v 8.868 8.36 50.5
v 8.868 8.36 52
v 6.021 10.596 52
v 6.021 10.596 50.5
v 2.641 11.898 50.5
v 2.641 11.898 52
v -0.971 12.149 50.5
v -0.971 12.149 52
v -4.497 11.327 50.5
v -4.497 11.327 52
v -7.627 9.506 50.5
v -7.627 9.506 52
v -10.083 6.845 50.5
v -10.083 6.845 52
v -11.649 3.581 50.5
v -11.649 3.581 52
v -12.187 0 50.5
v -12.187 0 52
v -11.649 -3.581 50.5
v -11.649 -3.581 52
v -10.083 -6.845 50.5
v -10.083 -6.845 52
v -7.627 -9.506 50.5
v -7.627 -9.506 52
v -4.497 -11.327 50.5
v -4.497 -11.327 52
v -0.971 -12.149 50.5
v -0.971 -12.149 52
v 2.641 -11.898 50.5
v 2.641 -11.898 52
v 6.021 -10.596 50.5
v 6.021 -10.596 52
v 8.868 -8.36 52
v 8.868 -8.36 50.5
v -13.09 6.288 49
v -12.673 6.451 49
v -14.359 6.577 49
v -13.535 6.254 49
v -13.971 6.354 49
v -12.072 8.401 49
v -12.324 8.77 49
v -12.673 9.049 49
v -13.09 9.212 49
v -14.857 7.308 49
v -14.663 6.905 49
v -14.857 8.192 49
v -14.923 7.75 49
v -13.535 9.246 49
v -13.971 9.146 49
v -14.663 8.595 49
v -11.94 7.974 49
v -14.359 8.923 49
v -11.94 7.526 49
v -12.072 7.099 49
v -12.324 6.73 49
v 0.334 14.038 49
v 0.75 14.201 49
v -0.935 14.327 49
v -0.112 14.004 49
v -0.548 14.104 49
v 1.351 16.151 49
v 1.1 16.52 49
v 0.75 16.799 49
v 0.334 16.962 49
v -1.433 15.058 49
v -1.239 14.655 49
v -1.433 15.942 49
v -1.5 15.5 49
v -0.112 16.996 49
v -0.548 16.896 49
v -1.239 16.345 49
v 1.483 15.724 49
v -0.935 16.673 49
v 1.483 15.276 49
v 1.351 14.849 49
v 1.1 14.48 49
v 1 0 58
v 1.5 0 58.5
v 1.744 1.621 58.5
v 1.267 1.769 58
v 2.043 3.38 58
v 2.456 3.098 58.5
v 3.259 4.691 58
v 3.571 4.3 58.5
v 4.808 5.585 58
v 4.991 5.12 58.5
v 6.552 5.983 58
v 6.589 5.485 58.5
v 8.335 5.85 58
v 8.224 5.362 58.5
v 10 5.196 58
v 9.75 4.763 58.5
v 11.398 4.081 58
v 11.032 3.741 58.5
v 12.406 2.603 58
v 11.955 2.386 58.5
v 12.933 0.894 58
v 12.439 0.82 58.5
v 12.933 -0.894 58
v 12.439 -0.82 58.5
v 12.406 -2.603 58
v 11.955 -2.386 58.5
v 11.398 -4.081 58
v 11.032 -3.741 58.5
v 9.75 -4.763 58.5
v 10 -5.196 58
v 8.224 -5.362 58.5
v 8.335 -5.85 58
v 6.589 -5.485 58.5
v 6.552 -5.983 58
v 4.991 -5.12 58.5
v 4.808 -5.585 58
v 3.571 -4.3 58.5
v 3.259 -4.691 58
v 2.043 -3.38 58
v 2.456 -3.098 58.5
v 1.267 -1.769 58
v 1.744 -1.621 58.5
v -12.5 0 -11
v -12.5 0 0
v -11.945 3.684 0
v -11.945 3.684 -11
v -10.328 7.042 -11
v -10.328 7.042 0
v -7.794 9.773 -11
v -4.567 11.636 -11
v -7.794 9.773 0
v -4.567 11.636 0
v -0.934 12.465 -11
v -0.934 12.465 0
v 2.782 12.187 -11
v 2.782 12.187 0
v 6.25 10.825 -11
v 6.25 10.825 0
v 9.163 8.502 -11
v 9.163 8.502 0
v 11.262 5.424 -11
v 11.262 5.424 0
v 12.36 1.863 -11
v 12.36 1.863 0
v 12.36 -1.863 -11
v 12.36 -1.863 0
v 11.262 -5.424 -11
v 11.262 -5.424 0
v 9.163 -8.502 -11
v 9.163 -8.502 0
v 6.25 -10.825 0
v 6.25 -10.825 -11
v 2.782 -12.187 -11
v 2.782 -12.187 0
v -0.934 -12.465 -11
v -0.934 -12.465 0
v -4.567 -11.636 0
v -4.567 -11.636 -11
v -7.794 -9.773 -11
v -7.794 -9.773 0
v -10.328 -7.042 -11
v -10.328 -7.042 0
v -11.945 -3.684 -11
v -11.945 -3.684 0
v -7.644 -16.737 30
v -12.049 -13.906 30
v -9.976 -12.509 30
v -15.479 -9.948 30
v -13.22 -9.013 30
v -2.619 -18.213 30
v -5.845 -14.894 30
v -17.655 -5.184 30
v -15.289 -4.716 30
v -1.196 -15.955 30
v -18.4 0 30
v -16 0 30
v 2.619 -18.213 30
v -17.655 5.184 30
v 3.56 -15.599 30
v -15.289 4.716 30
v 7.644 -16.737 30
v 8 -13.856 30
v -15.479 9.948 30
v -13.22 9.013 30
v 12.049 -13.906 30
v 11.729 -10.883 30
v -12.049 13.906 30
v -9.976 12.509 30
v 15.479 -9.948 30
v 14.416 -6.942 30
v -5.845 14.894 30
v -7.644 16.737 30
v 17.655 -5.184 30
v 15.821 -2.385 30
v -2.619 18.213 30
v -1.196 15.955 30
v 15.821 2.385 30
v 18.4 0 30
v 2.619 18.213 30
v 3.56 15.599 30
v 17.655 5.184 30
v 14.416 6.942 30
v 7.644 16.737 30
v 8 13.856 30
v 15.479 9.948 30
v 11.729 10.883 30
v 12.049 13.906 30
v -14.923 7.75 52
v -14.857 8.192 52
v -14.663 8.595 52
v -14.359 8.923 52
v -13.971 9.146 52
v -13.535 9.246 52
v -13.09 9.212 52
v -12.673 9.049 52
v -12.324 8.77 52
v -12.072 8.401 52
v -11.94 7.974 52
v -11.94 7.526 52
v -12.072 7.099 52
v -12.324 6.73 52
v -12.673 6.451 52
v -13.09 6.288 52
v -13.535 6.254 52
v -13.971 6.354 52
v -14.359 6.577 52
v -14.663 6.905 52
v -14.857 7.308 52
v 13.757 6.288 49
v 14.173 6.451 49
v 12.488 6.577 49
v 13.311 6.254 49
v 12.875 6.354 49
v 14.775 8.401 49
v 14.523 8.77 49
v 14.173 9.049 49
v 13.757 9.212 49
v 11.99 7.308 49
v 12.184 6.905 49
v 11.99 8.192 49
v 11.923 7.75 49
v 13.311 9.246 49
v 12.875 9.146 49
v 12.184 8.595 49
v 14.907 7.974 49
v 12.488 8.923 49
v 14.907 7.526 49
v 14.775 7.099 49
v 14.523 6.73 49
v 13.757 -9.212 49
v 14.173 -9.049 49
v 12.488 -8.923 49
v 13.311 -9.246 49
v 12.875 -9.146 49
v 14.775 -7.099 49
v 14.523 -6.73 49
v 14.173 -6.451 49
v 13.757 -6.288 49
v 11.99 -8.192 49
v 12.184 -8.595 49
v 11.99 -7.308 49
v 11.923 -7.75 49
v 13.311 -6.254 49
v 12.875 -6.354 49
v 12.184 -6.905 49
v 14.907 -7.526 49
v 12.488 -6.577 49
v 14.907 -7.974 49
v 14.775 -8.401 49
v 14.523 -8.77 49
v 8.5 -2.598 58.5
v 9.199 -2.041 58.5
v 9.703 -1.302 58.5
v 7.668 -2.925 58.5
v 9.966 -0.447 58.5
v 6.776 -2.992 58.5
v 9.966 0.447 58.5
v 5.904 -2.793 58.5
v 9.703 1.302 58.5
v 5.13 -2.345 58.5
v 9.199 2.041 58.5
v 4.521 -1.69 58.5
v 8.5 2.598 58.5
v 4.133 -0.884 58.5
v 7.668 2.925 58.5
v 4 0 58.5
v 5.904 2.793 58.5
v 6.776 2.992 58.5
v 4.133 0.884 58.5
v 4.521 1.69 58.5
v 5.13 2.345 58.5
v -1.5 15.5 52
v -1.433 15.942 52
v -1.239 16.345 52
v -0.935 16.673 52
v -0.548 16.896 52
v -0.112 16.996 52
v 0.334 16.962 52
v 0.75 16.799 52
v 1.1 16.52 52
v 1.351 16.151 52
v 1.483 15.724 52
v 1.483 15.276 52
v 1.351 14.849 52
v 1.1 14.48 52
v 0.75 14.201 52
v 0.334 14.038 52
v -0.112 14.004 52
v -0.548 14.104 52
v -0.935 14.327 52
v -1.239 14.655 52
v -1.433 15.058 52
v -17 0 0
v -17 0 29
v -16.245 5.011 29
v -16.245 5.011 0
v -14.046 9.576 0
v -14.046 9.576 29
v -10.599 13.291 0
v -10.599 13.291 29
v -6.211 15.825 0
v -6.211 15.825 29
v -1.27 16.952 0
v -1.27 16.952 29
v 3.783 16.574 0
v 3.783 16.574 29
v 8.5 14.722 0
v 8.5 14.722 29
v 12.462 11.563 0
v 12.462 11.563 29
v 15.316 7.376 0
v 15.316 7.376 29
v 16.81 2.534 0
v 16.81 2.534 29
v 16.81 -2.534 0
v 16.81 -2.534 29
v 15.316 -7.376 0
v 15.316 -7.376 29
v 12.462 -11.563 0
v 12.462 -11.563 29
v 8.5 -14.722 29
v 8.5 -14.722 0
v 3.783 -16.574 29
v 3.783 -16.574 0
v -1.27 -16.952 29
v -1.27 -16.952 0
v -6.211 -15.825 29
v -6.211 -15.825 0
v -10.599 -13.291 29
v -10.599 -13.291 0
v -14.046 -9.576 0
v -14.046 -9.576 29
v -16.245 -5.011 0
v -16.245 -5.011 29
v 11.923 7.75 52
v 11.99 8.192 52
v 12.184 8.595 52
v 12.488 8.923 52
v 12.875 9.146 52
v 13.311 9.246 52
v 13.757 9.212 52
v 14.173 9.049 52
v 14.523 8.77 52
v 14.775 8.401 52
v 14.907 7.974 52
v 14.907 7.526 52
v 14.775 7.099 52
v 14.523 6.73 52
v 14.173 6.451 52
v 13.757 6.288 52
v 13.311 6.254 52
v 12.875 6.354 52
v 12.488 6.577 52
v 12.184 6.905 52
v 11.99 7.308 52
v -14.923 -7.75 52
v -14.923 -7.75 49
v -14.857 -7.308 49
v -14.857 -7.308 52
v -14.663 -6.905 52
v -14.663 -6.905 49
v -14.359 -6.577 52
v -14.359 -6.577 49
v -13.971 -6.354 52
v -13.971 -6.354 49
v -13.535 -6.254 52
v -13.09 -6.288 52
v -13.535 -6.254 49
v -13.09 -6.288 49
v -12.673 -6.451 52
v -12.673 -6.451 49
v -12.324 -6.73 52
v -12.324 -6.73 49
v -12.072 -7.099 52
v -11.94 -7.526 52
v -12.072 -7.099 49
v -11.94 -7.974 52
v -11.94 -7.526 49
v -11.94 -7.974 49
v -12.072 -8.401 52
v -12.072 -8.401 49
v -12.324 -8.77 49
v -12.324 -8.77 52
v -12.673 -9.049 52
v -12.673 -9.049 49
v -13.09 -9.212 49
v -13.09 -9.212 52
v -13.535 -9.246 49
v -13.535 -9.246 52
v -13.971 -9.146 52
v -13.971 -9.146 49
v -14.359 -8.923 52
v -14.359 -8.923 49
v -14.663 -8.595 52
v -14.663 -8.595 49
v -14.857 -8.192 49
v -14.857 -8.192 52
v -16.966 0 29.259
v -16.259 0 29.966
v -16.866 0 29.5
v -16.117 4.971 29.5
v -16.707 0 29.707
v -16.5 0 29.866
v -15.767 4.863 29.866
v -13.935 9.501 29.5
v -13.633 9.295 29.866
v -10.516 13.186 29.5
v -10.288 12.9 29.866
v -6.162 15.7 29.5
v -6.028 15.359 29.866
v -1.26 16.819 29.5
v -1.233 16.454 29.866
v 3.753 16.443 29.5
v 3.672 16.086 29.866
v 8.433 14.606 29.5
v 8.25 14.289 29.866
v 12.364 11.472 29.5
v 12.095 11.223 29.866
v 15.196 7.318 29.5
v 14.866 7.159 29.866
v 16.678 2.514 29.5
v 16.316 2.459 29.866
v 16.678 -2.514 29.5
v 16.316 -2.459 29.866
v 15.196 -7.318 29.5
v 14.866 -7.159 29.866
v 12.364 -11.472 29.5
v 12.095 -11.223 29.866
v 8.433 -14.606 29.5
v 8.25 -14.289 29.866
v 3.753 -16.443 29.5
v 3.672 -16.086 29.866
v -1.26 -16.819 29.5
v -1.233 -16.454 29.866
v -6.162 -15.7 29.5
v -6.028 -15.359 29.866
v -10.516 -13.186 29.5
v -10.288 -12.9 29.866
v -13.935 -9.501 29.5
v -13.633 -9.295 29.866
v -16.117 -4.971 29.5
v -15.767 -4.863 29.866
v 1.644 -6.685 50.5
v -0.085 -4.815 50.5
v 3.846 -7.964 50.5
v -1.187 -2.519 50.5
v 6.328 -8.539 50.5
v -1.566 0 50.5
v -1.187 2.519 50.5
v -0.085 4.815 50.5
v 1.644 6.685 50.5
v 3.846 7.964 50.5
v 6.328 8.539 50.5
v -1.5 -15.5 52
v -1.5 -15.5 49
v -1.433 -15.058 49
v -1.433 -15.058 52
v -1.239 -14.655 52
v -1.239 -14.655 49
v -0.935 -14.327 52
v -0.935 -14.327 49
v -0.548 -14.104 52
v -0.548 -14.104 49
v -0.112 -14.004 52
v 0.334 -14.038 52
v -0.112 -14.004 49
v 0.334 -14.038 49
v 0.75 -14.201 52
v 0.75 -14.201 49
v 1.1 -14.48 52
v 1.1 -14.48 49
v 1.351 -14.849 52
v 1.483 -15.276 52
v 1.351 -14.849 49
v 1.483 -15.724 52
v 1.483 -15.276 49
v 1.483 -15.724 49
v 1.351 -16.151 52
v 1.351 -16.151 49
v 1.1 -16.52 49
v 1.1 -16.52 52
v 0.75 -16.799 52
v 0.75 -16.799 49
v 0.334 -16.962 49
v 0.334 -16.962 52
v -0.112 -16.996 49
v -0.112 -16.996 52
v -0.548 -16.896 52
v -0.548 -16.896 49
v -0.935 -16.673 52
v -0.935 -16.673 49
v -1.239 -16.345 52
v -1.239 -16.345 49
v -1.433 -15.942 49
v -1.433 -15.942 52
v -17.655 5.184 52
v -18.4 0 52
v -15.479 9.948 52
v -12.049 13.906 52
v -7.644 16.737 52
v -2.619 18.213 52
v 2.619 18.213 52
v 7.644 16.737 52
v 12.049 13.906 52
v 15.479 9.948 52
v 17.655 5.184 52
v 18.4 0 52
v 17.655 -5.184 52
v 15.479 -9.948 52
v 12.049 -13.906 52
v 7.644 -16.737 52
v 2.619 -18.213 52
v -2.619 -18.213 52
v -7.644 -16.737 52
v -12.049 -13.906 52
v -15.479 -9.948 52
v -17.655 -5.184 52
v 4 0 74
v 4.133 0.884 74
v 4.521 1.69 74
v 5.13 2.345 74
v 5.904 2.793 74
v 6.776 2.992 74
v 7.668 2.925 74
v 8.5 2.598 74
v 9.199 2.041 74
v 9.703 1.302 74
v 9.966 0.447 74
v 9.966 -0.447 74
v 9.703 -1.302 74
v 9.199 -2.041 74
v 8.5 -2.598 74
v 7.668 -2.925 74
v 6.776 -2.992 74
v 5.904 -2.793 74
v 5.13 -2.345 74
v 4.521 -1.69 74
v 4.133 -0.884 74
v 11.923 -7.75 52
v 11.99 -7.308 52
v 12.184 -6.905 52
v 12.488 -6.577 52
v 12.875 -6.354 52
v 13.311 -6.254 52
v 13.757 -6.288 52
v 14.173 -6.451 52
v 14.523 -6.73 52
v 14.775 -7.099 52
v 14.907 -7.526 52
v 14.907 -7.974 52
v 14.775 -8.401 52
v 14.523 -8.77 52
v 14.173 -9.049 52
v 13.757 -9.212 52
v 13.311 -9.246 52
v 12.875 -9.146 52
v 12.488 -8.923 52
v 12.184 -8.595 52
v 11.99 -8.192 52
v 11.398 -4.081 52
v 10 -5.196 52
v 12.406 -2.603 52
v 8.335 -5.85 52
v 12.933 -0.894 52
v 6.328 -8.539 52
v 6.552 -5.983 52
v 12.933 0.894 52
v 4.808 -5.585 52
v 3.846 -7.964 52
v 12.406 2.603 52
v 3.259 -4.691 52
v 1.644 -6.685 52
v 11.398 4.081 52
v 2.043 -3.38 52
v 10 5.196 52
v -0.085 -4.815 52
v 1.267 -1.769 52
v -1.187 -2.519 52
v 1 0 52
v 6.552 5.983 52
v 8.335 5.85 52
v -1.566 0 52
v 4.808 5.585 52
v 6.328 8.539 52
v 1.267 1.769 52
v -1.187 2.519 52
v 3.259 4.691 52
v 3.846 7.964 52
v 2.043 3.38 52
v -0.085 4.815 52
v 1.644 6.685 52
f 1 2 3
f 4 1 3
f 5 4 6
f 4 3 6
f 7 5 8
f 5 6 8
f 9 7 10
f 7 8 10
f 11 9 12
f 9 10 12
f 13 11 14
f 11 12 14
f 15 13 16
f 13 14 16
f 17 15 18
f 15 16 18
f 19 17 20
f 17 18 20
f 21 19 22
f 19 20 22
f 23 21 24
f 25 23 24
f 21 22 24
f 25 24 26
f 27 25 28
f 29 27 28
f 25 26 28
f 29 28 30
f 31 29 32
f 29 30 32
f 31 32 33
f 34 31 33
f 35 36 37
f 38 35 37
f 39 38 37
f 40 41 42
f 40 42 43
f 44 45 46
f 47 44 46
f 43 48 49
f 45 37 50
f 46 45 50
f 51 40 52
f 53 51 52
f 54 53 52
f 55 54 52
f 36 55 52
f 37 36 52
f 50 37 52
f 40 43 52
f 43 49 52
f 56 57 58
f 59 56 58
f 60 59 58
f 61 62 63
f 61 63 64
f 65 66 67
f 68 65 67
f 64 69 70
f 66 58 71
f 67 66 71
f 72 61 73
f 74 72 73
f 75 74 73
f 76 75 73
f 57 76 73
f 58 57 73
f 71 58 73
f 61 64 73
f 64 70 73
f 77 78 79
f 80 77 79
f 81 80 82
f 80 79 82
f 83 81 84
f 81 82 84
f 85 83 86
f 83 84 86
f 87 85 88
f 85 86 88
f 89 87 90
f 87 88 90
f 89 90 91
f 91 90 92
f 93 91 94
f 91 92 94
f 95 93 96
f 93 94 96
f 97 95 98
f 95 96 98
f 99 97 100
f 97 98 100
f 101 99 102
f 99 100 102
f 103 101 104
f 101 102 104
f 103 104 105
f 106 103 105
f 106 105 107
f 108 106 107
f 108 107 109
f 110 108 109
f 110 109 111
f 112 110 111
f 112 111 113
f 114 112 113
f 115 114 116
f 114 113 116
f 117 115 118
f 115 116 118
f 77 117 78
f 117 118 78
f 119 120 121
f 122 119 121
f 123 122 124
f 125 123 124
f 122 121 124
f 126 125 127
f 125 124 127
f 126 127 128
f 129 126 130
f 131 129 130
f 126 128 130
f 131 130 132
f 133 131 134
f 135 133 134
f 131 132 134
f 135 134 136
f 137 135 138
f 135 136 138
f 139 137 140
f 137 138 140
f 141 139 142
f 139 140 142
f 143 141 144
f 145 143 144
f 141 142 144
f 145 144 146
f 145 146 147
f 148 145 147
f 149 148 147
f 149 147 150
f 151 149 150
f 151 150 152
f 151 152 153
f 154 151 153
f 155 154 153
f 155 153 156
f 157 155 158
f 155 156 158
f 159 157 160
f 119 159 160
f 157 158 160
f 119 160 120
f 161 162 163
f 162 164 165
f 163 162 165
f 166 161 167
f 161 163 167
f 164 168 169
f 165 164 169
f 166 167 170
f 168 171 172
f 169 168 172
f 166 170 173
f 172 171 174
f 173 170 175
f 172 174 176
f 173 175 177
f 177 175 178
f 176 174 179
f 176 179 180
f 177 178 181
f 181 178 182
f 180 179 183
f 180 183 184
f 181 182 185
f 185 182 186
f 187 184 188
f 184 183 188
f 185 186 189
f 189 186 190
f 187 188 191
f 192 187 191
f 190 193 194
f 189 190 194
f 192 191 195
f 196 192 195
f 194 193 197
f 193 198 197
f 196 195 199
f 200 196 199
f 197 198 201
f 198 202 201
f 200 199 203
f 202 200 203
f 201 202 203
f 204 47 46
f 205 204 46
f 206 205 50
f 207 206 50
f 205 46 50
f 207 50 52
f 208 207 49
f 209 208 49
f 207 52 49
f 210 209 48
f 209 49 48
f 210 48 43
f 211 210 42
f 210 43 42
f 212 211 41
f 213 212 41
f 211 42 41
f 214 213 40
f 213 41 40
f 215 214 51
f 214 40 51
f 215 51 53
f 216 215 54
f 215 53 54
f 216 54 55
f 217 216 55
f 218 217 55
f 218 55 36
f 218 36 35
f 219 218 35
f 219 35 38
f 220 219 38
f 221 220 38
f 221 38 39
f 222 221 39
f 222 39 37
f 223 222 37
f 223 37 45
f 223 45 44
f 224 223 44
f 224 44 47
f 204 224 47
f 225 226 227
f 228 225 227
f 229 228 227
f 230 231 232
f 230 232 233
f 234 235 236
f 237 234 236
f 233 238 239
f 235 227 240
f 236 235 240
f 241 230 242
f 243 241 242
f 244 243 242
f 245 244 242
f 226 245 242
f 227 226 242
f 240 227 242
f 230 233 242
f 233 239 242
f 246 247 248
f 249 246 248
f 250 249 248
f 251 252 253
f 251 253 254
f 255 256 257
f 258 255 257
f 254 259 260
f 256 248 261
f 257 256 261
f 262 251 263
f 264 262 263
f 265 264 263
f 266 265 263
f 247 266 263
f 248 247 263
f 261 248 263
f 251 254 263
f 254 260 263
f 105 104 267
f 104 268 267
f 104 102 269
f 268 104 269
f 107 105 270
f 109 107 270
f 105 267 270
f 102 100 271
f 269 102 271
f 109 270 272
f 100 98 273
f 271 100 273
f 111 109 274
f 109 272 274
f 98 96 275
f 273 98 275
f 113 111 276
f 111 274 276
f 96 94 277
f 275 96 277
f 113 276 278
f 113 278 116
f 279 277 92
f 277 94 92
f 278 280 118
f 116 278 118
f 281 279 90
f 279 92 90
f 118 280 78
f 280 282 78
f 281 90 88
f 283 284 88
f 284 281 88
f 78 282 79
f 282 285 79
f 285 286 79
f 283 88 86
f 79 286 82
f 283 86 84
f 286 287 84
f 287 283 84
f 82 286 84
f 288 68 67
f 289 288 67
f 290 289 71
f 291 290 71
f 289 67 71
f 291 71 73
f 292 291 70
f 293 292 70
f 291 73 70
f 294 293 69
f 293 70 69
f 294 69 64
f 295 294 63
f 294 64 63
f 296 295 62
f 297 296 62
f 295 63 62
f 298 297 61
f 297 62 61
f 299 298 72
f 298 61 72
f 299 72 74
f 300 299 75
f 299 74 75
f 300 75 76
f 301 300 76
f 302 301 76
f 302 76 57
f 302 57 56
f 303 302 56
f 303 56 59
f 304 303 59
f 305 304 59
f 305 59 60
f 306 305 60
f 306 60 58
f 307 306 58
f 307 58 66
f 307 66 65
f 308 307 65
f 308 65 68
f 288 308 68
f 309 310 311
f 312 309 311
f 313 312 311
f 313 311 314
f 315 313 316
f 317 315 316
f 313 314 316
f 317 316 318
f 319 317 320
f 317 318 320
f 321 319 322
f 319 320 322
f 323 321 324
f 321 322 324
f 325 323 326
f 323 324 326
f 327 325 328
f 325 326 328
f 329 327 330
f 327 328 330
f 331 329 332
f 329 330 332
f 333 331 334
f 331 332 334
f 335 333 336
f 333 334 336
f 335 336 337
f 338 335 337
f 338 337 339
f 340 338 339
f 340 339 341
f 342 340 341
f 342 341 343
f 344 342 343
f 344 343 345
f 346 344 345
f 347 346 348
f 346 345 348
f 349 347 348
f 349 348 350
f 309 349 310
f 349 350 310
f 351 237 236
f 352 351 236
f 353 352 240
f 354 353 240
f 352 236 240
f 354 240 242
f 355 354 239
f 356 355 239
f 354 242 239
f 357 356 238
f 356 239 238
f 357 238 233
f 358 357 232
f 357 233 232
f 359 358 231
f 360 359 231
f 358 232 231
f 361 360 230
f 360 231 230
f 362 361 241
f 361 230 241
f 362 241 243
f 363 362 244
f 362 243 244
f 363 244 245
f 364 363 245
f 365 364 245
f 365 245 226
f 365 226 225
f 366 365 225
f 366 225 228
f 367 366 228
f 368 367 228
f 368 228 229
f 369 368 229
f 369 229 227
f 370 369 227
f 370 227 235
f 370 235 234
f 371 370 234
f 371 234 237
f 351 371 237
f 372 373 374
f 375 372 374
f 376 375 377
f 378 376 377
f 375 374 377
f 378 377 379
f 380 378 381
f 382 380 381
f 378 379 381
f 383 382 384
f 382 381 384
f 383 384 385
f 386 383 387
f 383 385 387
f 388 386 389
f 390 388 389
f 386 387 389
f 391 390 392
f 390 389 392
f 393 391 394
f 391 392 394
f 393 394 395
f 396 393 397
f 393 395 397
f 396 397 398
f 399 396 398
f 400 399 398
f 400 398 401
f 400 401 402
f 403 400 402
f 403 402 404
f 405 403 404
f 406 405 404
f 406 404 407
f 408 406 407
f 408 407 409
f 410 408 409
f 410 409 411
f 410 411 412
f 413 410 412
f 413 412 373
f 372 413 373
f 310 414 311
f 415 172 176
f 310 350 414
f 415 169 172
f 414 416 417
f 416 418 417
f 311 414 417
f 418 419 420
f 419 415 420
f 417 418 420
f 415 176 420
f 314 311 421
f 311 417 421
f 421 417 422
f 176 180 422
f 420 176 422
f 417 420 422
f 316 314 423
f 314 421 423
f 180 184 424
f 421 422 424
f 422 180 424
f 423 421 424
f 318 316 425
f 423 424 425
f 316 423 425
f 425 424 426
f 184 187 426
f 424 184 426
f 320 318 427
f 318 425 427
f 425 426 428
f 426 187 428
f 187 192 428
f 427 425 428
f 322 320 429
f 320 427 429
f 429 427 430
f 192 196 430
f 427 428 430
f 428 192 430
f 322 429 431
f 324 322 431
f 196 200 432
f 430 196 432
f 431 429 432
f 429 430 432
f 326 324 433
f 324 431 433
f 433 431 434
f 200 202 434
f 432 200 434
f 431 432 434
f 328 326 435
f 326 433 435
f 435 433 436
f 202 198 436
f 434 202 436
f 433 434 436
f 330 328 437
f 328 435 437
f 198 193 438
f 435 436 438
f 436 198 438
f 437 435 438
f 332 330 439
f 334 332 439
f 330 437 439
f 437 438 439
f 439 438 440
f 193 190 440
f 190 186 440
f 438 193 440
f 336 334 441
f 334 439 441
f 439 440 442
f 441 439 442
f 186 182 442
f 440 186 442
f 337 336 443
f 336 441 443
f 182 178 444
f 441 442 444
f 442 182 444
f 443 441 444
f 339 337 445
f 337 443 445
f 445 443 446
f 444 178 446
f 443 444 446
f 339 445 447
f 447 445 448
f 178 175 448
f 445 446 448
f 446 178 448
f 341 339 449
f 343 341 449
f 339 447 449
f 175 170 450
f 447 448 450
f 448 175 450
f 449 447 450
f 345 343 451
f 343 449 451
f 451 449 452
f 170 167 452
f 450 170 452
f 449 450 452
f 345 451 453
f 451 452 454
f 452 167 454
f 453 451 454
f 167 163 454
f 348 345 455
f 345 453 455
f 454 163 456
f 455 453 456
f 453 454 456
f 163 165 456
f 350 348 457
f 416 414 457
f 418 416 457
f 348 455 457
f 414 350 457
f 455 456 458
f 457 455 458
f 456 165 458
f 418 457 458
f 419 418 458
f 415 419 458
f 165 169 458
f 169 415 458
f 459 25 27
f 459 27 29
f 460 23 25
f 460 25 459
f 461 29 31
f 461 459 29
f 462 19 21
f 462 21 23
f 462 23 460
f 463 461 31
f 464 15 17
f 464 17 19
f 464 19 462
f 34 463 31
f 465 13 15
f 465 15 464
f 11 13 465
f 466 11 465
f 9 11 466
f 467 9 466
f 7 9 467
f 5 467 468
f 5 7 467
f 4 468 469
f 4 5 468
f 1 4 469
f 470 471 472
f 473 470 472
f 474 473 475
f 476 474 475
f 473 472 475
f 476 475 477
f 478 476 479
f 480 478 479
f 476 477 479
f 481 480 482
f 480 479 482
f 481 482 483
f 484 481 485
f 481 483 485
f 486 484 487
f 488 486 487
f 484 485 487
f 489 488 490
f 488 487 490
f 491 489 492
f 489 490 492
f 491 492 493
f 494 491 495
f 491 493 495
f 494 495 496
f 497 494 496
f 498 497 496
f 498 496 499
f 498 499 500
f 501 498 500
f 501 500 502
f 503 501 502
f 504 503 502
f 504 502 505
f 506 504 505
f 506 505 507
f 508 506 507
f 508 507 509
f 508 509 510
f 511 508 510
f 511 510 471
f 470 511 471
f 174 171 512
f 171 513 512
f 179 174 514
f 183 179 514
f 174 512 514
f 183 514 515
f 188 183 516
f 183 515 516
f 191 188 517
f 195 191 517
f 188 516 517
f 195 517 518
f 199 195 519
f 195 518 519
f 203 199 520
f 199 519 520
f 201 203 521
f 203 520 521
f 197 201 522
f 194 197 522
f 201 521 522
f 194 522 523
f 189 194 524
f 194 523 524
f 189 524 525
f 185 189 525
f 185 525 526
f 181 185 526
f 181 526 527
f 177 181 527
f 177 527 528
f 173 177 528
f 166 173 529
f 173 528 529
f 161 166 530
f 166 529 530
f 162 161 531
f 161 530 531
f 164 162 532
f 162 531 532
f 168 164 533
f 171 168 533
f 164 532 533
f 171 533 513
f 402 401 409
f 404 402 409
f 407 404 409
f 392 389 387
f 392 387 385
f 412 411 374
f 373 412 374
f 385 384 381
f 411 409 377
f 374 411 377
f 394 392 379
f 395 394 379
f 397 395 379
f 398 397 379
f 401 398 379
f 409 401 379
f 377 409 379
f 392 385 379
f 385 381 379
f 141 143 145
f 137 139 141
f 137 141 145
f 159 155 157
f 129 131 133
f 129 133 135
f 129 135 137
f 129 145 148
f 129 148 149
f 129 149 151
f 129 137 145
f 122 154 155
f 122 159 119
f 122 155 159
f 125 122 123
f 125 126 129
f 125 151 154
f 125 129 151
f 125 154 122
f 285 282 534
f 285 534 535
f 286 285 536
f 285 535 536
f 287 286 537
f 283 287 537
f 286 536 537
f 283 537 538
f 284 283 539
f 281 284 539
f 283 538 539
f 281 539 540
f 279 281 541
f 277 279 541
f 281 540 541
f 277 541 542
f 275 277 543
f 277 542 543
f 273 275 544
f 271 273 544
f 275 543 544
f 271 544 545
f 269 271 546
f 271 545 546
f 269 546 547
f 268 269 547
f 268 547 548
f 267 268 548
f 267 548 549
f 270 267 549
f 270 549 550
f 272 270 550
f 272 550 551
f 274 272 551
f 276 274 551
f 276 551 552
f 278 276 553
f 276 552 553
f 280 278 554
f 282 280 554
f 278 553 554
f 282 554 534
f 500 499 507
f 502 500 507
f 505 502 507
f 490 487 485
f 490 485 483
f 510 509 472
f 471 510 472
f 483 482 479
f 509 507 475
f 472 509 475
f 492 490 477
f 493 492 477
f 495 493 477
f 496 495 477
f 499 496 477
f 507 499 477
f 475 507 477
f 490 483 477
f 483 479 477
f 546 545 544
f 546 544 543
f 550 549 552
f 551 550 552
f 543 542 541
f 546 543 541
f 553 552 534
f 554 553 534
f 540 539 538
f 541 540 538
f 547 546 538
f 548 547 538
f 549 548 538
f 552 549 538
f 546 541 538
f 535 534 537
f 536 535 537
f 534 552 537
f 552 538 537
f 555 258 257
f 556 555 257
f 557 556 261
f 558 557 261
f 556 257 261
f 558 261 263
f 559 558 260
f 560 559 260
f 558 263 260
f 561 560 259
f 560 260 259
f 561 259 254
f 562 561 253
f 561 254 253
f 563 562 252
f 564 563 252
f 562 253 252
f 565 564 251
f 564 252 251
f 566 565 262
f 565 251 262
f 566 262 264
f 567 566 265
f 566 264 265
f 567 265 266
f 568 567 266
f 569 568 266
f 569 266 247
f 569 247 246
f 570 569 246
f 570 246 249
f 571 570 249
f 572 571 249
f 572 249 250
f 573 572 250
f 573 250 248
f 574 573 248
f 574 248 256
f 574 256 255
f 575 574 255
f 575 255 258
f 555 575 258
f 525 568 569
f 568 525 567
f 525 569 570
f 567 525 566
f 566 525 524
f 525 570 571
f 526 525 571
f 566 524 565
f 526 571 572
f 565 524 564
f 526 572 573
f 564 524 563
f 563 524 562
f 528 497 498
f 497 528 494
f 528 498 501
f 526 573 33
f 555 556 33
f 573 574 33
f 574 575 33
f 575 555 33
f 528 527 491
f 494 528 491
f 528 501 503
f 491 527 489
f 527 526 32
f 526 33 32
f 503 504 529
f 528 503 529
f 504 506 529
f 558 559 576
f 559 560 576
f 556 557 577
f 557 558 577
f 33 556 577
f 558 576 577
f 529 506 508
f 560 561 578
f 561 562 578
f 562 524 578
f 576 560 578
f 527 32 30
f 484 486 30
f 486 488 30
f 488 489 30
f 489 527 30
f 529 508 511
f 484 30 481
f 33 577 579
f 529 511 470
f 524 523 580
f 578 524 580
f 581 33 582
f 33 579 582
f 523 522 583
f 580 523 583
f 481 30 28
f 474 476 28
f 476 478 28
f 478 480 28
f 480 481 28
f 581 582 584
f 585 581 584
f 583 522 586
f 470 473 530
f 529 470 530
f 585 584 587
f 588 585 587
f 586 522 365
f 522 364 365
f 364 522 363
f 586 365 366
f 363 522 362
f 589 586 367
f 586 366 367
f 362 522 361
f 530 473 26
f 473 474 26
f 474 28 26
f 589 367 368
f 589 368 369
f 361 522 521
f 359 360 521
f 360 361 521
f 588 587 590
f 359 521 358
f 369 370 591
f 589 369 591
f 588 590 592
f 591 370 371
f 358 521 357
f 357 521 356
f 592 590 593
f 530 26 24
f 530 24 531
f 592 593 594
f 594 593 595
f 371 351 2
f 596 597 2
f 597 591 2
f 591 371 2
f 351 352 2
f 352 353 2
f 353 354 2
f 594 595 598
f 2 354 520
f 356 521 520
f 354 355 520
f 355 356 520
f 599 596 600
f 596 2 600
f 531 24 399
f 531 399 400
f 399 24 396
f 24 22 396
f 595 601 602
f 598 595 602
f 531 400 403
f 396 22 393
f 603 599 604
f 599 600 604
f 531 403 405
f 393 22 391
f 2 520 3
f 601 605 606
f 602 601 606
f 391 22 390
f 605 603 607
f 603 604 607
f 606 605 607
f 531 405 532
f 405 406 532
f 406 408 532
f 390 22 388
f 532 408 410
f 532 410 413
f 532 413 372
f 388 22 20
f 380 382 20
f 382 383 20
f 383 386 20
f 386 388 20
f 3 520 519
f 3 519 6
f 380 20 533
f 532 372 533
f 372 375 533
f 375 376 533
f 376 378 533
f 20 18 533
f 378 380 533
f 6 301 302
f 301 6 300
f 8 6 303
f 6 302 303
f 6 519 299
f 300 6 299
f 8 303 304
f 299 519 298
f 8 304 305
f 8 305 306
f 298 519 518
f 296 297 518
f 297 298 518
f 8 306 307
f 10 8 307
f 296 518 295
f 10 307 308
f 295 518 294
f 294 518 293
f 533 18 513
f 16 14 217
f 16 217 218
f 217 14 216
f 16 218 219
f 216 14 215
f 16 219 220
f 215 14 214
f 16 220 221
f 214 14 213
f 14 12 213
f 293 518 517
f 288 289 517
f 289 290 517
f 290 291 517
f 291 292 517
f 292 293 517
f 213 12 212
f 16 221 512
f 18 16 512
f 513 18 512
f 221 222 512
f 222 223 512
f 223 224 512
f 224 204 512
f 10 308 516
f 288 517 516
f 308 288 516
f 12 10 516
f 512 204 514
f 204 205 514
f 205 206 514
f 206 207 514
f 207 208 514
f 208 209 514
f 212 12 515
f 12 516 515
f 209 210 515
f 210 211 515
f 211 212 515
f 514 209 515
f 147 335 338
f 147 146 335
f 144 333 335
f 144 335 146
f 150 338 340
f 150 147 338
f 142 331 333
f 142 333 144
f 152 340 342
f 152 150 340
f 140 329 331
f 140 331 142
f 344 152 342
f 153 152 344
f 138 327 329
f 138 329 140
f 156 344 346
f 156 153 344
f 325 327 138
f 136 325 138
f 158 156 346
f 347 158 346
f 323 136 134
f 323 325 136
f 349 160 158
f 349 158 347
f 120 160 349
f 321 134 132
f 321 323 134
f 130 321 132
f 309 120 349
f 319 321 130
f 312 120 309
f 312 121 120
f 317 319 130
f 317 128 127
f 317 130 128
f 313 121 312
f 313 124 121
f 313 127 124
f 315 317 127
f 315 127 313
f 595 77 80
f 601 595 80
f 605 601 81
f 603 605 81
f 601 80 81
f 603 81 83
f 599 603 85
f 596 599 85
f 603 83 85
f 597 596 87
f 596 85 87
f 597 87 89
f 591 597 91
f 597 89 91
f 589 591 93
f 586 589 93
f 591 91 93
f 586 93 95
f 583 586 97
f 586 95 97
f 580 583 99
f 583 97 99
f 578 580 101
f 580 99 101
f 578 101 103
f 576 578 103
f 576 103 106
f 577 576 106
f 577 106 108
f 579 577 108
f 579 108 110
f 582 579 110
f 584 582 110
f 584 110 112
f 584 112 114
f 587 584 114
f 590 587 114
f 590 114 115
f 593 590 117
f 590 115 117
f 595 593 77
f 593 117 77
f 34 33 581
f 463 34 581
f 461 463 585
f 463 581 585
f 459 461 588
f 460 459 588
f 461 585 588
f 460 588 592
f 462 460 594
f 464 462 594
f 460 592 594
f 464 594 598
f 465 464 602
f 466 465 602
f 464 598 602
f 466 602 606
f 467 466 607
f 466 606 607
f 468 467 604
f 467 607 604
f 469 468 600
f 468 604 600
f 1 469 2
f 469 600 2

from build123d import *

# Parameters (mm, degrees)
SKETCH2_R                    = 17
BOSS_EXTRUDE1_DEPTH          = 29
SKETCH3_R                    = 12.5
BOSS_EXTRUDE2_DEPTH          = 11
CUT_EXTRUDE1_DEPTH           = 1.5
F_3_0_3_DIAMETER_HOLE1_D     = 3
F_3_0_3_DIAMETER_HOLE1_DEPTH = 3
CHAMFER1_SIZE                = 0.5


with BuildPart() as part:
    # Sketch1 → Revolve1 (revolve)
    with BuildSketch(Plane.XZ, mode=Mode.PRIVATE) as revolve1_sk:
        with BuildLine():
            Line((18.4, 52), (0, 52))
            Line((0, 52), (0, 29))
            Line((0, 29), (17, 29))
            ThreePointArc((17, 29), (16.707106781, 29.707106781), (16, 30))
            Line((16, 30), (18.4, 30))
            Line((18.4, 30), (18.4, 52))
        make_face()
    revolve(revolve1_sk.sketch.rotate(Axis((0, 0, 52), (0, 0, -1)), 180), axis=Axis((0, 0, 52), (0, 0, -1)))

    # Sketch2 → Boss-Extrude1 (add)
    with BuildSketch(Plane(origin=(0, 0, 29), x_dir=(-1, 0, 0), z_dir=(0, 0, -1))):
        Circle(SKETCH2_R)
    extrude(amount=BOSS_EXTRUDE1_DEPTH)

    # Sketch3 → Boss-Extrude2 (add)
    with BuildSketch(Plane(origin=(0, 0, 0), x_dir=(-1, 0, 0), z_dir=(0, 0, -1))):
        Circle(SKETCH3_R)
    extrude(amount=BOSS_EXTRUDE2_DEPTH)

    # Sketch4 → Cut-Extrude1 (cut)
    with BuildSketch(Plane.XY.offset(52)):
        with BuildLine():
            ThreePointArc((8.868134735, 8.359715213), (-12.187233161, 0), (8.868134735, -8.359715213))
            ThreePointArc((8.868134735, -8.359715213), (-1.565907181, 0), (8.868134735, 8.359715213))
        make_face()
    extrude(amount=-CUT_EXTRUDE1_DEPTH, mode=Mode.SUBTRACT)

    # Sketch5 → Revolve2 (revolve)
    with BuildSketch(Plane.XZ, mode=Mode.PRIVATE) as revolve2_sk:
        Polygon((10, 74), (7, 74), (7, 52), (13, 52), (13, 58.5), (10, 58.5), align=None)
    revolve(revolve2_sk.sketch.rotate(Axis((7, 0, 74), (0, 0, -1)), 180), axis=Axis((7, 0, 74), (0, 0, -1)))

    # Ø3.0 (3) Diameter Hole1
    with Locations(Plane.XY.offset(52)):
        with Locations((-13.423393759, 7.75), (-13.423393759, -7.75), (0, -15.5), (13.423393759, -7.75), (13.423393759, 7.75), (0, 15.5)):
            Hole(F_3_0_3_DIAMETER_HOLE1_D / 2, depth=F_3_0_3_DIAMETER_HOLE1_DEPTH)

    # Chamfer1
    chamfer1_edges = [part.edges().sort_by_distance(p)[0] for p in [
        (13, 0, 58.5),
    ]]
    chamfer(chamfer1_edges, length=CHAMFER1_SIZE)


solid = part.part
